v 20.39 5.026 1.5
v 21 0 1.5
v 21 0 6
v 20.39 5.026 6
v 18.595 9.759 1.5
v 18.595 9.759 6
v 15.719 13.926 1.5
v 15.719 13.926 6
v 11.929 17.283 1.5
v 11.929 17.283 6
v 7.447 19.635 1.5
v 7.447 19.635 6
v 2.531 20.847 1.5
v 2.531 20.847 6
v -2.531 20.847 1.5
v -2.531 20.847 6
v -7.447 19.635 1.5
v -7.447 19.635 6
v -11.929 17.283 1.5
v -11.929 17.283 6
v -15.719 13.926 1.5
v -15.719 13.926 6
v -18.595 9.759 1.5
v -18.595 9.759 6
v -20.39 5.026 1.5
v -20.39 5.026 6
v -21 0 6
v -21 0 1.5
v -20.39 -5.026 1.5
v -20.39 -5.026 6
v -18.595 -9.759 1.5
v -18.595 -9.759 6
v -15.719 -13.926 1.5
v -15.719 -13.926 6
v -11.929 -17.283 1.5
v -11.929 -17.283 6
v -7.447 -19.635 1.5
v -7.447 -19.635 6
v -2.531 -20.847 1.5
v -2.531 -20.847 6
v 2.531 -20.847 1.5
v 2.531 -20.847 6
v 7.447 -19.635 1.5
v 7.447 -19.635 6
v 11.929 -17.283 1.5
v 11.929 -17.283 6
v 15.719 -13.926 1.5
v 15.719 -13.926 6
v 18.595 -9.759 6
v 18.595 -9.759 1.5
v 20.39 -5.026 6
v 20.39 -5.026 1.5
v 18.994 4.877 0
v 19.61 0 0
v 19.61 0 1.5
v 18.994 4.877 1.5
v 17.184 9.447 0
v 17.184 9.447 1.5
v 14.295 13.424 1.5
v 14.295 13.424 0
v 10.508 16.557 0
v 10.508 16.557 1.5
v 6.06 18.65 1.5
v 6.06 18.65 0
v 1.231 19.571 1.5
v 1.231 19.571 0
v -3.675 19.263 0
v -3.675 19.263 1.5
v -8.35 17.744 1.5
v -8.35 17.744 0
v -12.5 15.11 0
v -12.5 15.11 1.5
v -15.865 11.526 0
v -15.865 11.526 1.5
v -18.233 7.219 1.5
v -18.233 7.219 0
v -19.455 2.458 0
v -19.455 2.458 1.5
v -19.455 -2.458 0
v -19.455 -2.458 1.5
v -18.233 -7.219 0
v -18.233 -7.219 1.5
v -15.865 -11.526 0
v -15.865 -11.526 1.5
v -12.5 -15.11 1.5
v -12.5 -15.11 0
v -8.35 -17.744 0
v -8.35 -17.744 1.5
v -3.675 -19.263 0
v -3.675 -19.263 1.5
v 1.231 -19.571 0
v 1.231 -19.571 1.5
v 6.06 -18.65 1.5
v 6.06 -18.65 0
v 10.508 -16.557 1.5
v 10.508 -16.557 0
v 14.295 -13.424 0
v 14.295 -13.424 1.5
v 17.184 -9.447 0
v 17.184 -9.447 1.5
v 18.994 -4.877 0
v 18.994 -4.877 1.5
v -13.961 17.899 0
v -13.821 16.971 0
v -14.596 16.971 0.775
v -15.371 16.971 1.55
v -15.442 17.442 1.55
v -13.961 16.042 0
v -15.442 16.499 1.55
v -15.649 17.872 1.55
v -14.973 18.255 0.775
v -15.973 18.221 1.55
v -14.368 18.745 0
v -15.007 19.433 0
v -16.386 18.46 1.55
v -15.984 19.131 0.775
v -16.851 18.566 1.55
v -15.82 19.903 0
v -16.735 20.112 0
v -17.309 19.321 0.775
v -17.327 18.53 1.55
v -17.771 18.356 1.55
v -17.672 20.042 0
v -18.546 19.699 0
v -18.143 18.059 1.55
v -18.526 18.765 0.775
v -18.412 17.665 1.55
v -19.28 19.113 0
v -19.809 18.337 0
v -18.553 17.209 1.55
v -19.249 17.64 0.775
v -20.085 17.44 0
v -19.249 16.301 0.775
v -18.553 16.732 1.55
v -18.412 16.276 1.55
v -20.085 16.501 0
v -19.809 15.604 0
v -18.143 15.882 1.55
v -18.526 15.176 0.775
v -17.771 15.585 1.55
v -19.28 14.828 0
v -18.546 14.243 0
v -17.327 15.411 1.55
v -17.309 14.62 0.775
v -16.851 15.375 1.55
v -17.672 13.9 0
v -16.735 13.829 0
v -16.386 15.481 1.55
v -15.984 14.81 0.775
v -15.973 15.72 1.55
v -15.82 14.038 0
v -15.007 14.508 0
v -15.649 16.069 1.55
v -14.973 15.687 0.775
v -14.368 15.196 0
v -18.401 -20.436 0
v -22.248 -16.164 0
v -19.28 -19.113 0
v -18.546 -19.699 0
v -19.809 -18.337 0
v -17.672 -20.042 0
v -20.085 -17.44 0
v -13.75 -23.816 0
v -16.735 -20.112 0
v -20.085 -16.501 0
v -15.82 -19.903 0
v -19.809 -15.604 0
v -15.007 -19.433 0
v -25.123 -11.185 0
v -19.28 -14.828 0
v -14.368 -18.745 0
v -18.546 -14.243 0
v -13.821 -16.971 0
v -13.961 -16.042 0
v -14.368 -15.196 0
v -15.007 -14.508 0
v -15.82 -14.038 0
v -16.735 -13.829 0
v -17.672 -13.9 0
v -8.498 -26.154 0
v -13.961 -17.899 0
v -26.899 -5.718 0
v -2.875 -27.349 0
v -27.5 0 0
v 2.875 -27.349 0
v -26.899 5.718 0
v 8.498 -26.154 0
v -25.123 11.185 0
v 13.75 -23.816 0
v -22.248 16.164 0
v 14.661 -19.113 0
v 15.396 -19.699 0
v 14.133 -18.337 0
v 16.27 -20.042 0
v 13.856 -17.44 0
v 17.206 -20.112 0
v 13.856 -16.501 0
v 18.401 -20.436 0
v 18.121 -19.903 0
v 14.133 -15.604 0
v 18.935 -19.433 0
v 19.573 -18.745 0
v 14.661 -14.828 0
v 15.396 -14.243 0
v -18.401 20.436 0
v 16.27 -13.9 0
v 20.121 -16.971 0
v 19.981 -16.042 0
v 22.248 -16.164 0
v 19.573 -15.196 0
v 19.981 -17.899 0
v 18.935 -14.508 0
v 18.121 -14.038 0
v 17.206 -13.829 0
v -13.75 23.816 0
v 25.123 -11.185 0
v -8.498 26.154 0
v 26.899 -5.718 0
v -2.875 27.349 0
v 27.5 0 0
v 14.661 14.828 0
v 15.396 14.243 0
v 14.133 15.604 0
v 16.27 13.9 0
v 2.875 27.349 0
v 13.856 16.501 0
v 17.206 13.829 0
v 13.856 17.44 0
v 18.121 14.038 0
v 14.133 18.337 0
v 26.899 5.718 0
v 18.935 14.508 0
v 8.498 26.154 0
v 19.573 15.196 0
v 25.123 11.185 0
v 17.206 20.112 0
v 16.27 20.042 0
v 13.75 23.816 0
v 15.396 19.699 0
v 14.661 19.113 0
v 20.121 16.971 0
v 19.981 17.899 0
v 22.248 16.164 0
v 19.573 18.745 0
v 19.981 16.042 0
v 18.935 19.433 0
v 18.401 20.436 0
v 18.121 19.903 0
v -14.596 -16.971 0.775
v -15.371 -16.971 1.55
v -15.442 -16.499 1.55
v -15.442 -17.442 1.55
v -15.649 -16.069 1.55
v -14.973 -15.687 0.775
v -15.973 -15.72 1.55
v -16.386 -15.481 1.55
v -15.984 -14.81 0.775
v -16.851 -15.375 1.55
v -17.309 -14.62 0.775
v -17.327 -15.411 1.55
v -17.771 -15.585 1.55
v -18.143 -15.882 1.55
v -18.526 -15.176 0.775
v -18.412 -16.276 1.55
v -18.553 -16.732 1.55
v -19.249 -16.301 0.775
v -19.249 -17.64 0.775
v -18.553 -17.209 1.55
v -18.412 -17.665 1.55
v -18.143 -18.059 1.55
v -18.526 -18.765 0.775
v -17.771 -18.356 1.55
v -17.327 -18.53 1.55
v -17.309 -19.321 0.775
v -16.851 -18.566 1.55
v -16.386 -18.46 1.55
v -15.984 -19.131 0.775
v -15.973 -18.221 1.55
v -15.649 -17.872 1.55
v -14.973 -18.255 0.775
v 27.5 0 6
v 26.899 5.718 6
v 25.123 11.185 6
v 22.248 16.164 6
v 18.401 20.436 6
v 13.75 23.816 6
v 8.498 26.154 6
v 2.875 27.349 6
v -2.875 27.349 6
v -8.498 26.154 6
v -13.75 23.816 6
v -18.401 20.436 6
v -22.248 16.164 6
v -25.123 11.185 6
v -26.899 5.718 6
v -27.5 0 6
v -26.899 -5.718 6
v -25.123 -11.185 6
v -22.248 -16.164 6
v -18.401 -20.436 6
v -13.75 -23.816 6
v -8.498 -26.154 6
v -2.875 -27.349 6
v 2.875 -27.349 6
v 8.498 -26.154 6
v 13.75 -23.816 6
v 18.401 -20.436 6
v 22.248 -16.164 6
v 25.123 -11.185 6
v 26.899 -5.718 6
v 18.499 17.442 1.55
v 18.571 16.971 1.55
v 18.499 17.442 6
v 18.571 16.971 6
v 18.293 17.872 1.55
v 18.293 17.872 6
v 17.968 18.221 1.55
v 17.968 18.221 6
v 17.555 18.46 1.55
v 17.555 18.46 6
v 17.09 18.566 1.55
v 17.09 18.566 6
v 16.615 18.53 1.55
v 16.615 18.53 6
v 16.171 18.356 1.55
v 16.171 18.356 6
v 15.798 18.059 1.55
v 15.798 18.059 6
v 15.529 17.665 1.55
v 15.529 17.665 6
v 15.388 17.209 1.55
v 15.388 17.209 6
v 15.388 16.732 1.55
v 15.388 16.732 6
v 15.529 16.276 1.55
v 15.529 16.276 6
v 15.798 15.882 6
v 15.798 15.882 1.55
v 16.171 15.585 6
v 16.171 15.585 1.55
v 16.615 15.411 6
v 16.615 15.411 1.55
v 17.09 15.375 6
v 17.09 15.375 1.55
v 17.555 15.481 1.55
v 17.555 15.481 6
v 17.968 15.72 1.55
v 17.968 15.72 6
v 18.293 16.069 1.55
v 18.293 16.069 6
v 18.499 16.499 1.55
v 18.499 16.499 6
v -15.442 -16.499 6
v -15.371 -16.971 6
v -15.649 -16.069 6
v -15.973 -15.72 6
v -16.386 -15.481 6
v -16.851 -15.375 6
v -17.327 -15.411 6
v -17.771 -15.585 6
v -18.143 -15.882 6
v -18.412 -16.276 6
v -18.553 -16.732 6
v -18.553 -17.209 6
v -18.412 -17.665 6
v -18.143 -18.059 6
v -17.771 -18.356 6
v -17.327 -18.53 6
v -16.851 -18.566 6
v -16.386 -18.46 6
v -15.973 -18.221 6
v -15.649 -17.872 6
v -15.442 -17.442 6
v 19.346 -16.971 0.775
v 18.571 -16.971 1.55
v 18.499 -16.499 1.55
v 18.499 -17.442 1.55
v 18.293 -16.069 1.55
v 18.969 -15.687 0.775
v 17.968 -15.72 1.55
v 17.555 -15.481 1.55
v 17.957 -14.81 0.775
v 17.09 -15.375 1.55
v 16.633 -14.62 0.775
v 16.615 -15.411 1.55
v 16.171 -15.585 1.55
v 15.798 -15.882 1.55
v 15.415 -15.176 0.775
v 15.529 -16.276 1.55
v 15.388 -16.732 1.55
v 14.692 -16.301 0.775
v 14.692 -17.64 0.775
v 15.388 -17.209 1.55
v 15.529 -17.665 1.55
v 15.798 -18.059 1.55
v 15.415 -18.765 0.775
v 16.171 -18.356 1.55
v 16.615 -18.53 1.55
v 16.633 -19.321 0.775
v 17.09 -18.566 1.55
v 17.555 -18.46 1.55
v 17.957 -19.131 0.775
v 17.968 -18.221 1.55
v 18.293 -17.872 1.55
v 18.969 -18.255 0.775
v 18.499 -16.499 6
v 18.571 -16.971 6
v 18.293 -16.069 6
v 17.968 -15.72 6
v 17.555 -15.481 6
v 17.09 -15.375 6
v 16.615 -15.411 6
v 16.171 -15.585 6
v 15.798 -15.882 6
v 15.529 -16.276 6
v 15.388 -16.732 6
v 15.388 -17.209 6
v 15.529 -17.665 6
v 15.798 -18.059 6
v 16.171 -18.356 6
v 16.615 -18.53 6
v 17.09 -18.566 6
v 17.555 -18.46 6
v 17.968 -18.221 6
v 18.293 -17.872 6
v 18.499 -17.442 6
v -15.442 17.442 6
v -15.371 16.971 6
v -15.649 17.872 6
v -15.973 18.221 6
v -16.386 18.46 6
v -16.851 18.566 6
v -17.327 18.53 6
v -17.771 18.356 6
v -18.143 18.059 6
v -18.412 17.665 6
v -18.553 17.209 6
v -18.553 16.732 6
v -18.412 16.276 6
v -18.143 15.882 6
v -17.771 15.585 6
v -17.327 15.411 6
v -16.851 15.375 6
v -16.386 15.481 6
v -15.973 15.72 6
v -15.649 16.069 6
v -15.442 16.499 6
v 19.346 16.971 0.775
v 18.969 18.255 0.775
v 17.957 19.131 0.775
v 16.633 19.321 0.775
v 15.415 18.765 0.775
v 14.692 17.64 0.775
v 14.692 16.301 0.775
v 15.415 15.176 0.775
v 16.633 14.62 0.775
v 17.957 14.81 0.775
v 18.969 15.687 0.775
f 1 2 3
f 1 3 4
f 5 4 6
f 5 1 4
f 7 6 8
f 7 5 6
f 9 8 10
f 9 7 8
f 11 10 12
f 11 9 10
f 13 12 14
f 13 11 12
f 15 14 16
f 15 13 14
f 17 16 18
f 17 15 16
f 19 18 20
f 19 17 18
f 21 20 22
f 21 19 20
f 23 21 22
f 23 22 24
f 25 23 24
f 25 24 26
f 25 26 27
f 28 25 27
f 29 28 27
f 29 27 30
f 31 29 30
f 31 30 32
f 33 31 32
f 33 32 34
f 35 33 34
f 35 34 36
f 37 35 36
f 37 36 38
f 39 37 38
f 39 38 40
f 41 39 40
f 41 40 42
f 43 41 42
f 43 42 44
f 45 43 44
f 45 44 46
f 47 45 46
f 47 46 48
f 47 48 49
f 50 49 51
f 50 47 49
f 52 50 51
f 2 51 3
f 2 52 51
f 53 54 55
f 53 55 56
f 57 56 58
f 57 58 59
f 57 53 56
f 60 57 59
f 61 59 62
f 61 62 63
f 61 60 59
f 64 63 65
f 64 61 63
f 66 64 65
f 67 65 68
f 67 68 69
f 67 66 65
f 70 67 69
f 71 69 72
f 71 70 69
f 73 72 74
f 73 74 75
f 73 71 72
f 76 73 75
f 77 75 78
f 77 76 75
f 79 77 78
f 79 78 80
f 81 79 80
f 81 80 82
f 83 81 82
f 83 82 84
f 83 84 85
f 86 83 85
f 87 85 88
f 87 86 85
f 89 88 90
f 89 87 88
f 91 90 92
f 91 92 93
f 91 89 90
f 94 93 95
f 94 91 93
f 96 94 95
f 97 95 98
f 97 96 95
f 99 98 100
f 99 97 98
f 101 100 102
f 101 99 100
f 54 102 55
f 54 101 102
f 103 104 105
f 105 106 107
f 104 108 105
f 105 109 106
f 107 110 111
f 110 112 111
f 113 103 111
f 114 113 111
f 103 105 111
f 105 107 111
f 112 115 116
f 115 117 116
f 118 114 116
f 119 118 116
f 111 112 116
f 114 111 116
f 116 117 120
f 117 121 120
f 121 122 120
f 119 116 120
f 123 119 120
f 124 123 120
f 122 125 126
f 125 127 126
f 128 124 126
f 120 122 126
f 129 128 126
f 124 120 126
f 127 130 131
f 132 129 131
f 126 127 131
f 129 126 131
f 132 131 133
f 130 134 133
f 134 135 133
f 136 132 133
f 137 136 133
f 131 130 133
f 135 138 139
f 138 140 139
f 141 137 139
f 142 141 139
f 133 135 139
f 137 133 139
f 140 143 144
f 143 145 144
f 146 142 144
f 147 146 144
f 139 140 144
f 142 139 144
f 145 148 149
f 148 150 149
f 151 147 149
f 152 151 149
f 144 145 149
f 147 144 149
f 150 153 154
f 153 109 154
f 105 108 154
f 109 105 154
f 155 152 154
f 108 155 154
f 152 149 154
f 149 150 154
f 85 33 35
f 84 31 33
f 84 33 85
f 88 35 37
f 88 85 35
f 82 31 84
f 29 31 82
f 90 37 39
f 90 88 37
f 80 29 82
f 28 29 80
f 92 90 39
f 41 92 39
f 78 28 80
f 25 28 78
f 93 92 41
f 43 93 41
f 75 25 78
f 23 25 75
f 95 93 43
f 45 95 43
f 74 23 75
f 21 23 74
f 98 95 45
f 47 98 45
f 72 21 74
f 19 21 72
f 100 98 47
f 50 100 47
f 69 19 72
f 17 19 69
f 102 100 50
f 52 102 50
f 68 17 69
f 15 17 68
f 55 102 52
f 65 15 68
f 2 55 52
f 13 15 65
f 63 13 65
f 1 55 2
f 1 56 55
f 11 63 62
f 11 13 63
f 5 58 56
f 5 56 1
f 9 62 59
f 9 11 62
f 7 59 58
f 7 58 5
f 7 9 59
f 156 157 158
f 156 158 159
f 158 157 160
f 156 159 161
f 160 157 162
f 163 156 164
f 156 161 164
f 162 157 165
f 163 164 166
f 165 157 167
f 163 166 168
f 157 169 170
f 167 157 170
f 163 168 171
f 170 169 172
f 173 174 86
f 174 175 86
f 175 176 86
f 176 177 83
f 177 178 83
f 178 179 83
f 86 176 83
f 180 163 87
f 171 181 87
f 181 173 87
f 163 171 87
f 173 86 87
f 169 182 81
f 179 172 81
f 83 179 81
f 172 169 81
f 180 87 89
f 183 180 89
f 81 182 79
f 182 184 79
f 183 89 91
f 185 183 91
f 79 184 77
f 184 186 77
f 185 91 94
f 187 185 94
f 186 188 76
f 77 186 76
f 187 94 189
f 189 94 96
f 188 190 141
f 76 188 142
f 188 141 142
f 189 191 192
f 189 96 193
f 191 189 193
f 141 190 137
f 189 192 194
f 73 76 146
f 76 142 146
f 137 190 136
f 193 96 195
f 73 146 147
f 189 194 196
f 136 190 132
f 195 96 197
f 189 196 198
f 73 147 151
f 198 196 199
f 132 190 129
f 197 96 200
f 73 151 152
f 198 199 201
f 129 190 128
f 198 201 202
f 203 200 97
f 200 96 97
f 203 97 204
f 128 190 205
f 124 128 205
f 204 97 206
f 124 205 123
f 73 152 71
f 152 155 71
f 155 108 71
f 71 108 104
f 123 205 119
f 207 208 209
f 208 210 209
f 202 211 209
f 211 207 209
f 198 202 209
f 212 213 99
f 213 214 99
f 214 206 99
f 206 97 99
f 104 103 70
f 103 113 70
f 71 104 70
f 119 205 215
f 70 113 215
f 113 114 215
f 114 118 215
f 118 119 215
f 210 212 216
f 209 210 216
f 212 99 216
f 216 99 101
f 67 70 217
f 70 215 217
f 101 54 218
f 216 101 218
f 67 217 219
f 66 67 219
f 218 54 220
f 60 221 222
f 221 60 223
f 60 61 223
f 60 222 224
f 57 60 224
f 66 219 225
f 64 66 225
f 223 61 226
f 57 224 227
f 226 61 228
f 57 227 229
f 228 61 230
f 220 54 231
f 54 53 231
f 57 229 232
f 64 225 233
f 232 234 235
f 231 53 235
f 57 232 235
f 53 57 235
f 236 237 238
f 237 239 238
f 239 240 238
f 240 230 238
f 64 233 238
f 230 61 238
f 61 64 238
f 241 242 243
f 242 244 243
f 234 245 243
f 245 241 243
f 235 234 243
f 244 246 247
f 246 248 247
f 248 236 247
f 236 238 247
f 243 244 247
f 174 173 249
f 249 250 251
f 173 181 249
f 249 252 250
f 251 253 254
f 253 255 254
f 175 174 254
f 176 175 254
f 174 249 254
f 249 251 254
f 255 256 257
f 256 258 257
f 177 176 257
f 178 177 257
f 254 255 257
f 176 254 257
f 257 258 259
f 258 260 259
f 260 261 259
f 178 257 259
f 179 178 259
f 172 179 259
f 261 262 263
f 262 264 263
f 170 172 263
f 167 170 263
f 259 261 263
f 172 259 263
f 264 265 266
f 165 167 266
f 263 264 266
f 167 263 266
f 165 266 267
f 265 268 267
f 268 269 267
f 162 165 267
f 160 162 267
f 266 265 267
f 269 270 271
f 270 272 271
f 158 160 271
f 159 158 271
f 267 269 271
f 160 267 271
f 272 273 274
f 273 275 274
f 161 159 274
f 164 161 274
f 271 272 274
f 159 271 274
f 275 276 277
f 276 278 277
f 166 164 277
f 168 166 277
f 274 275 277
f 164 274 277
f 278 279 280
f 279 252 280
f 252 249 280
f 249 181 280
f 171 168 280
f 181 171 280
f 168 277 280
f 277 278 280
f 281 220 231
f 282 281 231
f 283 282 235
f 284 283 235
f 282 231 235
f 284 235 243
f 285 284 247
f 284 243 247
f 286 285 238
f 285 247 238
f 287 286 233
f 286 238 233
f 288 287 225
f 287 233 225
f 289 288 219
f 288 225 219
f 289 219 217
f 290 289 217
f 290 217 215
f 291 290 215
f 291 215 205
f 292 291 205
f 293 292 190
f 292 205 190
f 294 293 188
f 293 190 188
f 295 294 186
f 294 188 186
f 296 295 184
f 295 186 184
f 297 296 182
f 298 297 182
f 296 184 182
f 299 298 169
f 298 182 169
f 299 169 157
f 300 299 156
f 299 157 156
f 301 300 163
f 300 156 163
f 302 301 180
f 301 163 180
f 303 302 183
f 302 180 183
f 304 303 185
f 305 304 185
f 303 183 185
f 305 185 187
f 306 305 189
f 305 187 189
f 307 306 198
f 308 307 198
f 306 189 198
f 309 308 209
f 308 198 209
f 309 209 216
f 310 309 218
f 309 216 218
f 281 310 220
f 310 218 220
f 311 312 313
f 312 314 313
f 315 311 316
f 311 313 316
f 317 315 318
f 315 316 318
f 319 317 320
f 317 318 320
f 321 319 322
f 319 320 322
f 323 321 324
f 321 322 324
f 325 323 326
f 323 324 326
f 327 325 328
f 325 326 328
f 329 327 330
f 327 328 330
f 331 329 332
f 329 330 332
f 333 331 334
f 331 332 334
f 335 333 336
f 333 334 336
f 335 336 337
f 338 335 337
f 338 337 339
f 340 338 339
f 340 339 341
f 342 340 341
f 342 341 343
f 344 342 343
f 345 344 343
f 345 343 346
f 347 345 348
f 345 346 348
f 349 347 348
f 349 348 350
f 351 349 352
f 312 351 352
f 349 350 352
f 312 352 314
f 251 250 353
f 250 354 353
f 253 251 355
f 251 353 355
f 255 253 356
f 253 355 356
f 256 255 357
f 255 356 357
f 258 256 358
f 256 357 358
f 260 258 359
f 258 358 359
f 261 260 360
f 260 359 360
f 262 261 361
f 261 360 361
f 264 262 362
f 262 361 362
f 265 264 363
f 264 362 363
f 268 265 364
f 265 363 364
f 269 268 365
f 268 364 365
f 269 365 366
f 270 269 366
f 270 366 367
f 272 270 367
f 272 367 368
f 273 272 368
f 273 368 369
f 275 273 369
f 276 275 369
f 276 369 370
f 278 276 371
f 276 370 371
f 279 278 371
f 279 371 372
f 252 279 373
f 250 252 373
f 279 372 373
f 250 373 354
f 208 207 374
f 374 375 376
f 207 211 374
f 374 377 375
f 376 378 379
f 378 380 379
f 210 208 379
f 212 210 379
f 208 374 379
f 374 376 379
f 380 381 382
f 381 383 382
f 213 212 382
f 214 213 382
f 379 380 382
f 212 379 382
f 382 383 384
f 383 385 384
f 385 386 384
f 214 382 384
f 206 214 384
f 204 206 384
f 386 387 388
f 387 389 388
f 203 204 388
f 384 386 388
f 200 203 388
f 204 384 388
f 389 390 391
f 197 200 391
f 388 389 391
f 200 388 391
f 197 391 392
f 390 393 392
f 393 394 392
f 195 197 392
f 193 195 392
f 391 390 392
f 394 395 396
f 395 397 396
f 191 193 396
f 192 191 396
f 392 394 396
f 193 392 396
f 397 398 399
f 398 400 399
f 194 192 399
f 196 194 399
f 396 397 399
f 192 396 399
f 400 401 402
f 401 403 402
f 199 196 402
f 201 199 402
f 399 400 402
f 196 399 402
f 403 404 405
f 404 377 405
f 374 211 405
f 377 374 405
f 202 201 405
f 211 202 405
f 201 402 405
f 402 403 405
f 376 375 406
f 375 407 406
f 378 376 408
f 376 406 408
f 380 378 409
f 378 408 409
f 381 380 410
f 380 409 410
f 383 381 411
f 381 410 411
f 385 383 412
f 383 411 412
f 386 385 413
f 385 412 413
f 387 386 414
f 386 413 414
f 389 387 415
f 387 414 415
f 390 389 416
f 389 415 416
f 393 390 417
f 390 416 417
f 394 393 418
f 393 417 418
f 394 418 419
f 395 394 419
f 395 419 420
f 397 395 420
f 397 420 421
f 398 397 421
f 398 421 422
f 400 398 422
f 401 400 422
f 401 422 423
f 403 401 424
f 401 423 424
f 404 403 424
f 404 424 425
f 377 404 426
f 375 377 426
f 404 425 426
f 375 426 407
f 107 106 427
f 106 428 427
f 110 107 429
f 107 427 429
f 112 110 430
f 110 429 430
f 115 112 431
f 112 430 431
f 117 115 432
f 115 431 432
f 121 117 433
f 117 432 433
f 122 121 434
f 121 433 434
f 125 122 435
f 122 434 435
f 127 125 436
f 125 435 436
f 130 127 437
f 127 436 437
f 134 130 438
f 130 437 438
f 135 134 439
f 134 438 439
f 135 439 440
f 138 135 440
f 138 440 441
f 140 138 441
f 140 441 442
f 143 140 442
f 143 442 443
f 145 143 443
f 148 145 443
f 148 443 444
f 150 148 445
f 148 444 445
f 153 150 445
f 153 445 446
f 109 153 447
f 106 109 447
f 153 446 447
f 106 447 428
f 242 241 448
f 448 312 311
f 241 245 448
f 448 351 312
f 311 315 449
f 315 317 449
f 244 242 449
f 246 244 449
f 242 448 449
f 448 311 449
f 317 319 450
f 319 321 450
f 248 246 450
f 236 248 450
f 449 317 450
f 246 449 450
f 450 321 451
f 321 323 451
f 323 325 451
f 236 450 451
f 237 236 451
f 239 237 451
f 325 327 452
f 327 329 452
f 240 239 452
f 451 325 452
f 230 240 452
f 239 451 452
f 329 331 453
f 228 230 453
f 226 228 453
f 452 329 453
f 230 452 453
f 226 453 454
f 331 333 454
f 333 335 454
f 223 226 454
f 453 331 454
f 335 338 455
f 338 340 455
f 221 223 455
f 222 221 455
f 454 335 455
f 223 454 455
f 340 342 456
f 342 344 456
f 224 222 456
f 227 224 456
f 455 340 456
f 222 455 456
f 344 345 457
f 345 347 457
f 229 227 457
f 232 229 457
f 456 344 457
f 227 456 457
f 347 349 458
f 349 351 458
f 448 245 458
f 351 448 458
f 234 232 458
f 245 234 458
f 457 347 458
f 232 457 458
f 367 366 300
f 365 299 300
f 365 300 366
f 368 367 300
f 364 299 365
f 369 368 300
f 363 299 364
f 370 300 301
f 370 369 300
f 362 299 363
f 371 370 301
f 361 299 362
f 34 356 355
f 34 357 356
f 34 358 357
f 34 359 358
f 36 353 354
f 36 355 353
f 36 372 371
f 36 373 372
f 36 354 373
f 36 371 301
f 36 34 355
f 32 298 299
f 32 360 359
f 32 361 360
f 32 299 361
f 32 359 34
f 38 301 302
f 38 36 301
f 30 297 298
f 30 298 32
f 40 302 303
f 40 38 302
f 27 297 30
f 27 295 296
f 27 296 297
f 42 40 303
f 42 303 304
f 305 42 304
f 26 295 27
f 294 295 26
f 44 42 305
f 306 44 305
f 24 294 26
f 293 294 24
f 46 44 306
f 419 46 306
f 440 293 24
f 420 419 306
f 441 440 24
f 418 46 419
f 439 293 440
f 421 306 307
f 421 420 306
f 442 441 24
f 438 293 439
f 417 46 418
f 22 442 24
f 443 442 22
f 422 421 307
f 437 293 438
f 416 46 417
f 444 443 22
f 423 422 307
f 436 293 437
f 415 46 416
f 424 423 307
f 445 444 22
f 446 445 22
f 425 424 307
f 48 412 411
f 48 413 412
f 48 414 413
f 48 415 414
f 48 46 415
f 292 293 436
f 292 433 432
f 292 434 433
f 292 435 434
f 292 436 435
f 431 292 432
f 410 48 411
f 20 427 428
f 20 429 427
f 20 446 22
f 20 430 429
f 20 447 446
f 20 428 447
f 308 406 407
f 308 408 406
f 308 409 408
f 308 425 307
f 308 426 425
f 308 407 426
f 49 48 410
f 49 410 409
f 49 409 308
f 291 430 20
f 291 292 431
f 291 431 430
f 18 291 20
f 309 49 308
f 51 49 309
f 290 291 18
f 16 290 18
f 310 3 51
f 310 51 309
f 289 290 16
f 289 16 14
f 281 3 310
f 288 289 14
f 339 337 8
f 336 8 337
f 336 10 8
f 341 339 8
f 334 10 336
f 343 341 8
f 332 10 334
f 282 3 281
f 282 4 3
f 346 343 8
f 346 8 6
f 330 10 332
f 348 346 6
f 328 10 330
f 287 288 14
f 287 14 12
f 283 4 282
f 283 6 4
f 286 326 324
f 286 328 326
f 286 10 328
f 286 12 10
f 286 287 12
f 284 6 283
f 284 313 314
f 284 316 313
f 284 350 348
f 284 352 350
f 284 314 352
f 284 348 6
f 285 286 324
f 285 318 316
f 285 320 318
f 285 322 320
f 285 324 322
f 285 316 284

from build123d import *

# Parameters (mm, degrees)
SKETCH_1_R                   = 27.5
SKETCH_1_R_2                 = 21
EXTRUDE_1_DEPTH              = 6
SKETCH_1_3_R                 = 21
SKETCH_1_3_R_2               = 19.61
EXTRUDE_2_DEPTH              = 1.5
HOLE_WIZARD_M3_1_D           = 3.2
HOLE_WIZARD_M3_1_CSINK_D     = 6.3
HOLE_WIZARD_M3_1_CSINK_ANGLE = 90


with BuildPart() as part:
    # ｽｹｯﾁ1 → ﾎﾞｽ - 押し出し1 (new body)
    with BuildSketch(Plane.XY):
        Circle(SKETCH_1_R)
        Circle(SKETCH_1_R_2, mode=Mode.SUBTRACT)
    extrude(amount=EXTRUDE_1_DEPTH)

    # ｽｹｯﾁ1<3> → ﾎﾞｽ - 押し出し2 (add)
    with BuildSketch(Plane.XY):
        Circle(SKETCH_1_3_R)
        Circle(SKETCH_1_3_R_2, mode=Mode.SUBTRACT)
    extrude(amount=EXTRUDE_2_DEPTH)

    # M3 丸皿ねじ用皿穴1 (through all)
    with Locations(Plane(origin=(16.970562748, 16.970562748, 0), x_dir=(-1, 0, 0), z_dir=(0, 0, -1))):
        with Locations((0, 0), (33.941125496, 0), (33.941125496, -33.941125496), (0, -33.941125496)):
            CounterSinkHole(HOLE_WIZARD_M3_1_D / 2, HOLE_WIZARD_M3_1_CSINK_D / 2, counter_sink_angle=HOLE_WIZARD_M3_1_CSINK_ANGLE)


solid = part.part
